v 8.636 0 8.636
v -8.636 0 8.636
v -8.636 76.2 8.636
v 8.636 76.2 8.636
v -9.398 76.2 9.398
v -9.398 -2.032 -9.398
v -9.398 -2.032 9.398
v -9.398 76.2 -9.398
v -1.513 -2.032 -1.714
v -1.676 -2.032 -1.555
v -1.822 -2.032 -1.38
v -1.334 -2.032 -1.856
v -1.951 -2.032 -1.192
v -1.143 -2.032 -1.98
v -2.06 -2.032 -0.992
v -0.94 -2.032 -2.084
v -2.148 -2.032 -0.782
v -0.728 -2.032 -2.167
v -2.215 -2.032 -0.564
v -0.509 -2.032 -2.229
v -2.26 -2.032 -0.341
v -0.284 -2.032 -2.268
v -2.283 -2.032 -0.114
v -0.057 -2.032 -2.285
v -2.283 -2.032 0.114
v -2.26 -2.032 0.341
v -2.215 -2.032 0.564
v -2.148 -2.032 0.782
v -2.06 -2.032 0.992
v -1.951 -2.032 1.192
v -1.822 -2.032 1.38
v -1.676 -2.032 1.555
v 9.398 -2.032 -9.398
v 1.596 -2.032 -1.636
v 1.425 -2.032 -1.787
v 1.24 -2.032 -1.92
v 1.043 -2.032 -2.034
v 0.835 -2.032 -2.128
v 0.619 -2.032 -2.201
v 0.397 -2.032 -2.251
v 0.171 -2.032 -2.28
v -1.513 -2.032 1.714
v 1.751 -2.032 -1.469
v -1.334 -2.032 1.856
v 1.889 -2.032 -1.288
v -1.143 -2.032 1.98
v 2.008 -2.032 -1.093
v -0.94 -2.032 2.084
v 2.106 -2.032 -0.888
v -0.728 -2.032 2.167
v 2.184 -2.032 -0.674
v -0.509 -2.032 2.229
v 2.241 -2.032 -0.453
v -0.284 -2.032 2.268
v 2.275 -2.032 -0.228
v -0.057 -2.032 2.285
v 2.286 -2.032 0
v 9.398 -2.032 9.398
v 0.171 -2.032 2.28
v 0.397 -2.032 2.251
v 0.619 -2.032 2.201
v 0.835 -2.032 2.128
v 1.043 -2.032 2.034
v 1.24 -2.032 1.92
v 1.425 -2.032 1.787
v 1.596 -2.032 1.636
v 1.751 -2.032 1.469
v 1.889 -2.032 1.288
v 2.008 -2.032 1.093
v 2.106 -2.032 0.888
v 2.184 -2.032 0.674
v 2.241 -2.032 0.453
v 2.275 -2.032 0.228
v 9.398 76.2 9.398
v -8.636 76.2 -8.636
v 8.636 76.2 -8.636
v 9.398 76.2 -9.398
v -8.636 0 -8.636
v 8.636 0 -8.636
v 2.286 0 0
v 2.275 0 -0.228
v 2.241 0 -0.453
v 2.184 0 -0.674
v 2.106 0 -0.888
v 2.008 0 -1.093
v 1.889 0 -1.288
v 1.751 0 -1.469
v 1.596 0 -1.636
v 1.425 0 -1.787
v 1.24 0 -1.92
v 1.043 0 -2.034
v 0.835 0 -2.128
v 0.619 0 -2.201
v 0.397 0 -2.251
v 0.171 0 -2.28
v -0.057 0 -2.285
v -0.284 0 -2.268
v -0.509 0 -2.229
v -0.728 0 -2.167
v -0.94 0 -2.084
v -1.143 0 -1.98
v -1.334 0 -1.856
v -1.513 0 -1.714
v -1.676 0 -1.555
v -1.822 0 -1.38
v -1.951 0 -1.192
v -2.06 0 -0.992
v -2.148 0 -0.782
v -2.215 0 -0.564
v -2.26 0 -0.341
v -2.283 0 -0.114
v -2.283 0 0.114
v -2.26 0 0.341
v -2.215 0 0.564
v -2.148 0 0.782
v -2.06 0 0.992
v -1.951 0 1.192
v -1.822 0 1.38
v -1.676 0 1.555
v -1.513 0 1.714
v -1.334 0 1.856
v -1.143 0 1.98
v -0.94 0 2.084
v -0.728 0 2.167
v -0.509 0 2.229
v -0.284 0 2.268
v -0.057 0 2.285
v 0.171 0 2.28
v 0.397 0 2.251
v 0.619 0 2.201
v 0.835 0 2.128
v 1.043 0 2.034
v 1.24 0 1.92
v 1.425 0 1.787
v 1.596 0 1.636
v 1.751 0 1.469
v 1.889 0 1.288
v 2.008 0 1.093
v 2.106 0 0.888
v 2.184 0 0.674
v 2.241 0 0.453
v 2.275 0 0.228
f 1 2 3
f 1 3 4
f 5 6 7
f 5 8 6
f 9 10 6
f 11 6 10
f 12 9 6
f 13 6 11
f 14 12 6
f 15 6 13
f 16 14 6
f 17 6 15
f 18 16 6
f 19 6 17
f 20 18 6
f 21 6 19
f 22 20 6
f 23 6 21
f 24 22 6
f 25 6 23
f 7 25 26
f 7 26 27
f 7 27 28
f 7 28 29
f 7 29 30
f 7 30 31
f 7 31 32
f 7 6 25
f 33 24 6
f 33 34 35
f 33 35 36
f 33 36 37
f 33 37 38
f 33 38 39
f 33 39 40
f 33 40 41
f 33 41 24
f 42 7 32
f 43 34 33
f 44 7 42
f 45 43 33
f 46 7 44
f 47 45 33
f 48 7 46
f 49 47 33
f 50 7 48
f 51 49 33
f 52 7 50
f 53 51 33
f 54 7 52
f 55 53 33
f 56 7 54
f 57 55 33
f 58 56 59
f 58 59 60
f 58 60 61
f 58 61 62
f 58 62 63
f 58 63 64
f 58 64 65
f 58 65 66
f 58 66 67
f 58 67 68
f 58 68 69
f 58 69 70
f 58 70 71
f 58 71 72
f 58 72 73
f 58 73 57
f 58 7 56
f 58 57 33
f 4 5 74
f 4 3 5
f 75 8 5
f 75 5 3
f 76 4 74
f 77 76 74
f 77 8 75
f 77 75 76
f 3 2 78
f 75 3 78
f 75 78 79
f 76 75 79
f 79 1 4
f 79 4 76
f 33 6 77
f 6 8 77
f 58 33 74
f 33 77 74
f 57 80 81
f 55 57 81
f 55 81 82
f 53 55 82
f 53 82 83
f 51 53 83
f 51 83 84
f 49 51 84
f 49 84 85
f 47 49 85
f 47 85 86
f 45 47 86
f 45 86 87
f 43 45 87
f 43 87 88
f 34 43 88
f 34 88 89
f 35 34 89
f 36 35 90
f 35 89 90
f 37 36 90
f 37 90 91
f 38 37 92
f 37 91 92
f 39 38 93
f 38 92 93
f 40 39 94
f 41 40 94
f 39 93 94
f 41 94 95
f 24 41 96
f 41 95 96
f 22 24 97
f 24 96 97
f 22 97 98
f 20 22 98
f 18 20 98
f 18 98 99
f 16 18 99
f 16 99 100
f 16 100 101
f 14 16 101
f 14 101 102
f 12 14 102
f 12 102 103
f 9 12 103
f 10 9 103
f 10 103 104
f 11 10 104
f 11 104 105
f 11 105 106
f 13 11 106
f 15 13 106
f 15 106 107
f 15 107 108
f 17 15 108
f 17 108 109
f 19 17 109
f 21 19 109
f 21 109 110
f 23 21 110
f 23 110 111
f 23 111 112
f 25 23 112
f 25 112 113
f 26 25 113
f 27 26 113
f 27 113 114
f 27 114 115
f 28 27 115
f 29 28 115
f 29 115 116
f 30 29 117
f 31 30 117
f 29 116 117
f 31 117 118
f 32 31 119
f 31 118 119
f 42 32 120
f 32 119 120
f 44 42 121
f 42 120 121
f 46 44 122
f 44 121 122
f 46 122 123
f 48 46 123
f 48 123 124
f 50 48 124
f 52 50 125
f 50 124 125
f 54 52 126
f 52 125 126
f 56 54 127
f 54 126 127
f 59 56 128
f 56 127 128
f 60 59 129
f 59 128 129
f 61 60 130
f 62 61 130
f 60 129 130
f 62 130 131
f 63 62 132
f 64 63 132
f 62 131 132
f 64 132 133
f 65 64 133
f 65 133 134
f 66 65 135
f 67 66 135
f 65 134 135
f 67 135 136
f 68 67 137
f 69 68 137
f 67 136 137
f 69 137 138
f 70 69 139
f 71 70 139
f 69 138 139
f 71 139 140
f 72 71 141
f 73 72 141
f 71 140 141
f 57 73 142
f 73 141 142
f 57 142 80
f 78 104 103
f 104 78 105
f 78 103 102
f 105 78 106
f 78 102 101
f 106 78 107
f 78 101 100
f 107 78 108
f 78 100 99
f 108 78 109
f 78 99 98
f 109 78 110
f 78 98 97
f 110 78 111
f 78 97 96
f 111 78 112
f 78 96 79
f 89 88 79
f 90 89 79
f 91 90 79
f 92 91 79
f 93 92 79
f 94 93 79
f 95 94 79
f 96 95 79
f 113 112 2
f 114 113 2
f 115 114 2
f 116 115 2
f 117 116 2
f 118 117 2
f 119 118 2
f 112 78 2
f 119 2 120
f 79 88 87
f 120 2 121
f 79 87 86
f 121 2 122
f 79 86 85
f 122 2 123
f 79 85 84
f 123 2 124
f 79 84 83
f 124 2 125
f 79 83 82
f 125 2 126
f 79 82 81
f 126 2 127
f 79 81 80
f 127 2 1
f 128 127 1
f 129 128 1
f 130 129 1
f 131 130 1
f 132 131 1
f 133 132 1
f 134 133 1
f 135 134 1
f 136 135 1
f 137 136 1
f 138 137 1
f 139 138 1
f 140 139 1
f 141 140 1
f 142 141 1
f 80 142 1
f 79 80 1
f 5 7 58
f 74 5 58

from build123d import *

# Parameters (mm, degrees)
SKETCH1_W                        = 18.796
SKETCH1_H                        = 18.796
SKETCH1_W_2                      = 17.272
SKETCH1_H_2                      = 17.272
BOSS_EXTRUDE1_DEPTH              = 76.2
SKETCH2_W                        = 18.796
SKETCH2_H                        = 18.796
BOSS_EXTRUDE2_DEPTH              = 2.032
F_10_0_1935_DIAMETER_HOLE1_D     = 4.572
F_10_0_1935_DIAMETER_HOLE1_DEPTH = 6.35
F_10_0_1935_DIAMETER_HOLE1_TIP   = 1.373567375


with BuildPart() as part:
    # Sketch1 → Boss-Extrude1 (new body)
    with BuildSketch(Plane(origin=(0, 0, 0), x_dir=(1, 0, 0), z_dir=(0, 1, 0))):
        Rectangle(SKETCH1_W, SKETCH1_H)
        Rectangle(SKETCH1_W_2, SKETCH1_H_2, mode=Mode.SUBTRACT)
    extrude(amount=BOSS_EXTRUDE1_DEPTH)

    # Sketch2 → Boss-Extrude2 (add)
    with BuildSketch(Plane.XZ):
        Rectangle(SKETCH2_W, SKETCH2_H)
    extrude(amount=BOSS_EXTRUDE2_DEPTH)

    # #10 (0.1935) Diameter Hole1
    with Locations(Plane(origin=(0, -2.032, 0), x_dir=(-1, 0, 0), z_dir=(0, -1, 0))):
        with Locations((0, 0)):
            Hole(F_10_0_1935_DIAMETER_HOLE1_D / 2, depth=F_10_0_1935_DIAMETER_HOLE1_DEPTH)
            with Locations((0, 0, -(F_10_0_1935_DIAMETER_HOLE1_DEPTH + F_10_0_1935_DIAMETER_HOLE1_TIP / 2))):  # 118° drill point
                Cone(0, F_10_0_1935_DIAMETER_HOLE1_D / 2, F_10_0_1935_DIAMETER_HOLE1_TIP, mode=Mode.SUBTRACT)


solid = part.part
